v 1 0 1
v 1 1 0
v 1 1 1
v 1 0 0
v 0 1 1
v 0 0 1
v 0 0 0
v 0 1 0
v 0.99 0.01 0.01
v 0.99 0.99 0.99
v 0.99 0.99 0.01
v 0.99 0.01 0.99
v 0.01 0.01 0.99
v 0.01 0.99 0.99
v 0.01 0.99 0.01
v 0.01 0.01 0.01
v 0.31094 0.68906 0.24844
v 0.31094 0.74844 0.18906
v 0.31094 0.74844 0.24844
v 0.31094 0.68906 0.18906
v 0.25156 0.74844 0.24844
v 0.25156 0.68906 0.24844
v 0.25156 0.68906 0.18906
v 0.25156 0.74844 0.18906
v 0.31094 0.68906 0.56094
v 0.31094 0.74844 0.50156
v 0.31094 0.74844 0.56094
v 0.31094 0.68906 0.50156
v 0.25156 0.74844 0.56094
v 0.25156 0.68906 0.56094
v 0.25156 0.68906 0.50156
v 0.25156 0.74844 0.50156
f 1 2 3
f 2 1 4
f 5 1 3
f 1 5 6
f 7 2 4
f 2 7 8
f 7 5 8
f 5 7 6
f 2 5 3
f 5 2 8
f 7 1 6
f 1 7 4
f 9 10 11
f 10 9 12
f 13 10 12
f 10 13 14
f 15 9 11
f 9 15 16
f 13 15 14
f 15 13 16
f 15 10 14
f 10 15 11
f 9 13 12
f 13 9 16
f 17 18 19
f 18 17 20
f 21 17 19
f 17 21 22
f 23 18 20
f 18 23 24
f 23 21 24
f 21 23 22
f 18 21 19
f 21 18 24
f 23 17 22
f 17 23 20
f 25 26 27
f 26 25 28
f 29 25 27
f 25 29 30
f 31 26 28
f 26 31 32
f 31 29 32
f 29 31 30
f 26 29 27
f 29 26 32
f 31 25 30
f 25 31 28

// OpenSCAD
translate([0.28125, 0.71875, 0.21875]) color([0.23874719597172656, 0.5159213977515871, 0.8042715508319355]) cube([0.059375, 0.059375, 0.059375], center=true);
translate([0.28125, 0.71875, 0.53125]) color([0.6755197251802578, 0.41487488756696345, 0.5733633065217538]) cube([0.059375, 0.059375, 0.059375], center=true);
color([0.3,0.3,0.3,0.3]) difference() { cube([1,1,1]); translate([0.01,0.01,0.01]) cube([0.98,0.98,0.98]); }
